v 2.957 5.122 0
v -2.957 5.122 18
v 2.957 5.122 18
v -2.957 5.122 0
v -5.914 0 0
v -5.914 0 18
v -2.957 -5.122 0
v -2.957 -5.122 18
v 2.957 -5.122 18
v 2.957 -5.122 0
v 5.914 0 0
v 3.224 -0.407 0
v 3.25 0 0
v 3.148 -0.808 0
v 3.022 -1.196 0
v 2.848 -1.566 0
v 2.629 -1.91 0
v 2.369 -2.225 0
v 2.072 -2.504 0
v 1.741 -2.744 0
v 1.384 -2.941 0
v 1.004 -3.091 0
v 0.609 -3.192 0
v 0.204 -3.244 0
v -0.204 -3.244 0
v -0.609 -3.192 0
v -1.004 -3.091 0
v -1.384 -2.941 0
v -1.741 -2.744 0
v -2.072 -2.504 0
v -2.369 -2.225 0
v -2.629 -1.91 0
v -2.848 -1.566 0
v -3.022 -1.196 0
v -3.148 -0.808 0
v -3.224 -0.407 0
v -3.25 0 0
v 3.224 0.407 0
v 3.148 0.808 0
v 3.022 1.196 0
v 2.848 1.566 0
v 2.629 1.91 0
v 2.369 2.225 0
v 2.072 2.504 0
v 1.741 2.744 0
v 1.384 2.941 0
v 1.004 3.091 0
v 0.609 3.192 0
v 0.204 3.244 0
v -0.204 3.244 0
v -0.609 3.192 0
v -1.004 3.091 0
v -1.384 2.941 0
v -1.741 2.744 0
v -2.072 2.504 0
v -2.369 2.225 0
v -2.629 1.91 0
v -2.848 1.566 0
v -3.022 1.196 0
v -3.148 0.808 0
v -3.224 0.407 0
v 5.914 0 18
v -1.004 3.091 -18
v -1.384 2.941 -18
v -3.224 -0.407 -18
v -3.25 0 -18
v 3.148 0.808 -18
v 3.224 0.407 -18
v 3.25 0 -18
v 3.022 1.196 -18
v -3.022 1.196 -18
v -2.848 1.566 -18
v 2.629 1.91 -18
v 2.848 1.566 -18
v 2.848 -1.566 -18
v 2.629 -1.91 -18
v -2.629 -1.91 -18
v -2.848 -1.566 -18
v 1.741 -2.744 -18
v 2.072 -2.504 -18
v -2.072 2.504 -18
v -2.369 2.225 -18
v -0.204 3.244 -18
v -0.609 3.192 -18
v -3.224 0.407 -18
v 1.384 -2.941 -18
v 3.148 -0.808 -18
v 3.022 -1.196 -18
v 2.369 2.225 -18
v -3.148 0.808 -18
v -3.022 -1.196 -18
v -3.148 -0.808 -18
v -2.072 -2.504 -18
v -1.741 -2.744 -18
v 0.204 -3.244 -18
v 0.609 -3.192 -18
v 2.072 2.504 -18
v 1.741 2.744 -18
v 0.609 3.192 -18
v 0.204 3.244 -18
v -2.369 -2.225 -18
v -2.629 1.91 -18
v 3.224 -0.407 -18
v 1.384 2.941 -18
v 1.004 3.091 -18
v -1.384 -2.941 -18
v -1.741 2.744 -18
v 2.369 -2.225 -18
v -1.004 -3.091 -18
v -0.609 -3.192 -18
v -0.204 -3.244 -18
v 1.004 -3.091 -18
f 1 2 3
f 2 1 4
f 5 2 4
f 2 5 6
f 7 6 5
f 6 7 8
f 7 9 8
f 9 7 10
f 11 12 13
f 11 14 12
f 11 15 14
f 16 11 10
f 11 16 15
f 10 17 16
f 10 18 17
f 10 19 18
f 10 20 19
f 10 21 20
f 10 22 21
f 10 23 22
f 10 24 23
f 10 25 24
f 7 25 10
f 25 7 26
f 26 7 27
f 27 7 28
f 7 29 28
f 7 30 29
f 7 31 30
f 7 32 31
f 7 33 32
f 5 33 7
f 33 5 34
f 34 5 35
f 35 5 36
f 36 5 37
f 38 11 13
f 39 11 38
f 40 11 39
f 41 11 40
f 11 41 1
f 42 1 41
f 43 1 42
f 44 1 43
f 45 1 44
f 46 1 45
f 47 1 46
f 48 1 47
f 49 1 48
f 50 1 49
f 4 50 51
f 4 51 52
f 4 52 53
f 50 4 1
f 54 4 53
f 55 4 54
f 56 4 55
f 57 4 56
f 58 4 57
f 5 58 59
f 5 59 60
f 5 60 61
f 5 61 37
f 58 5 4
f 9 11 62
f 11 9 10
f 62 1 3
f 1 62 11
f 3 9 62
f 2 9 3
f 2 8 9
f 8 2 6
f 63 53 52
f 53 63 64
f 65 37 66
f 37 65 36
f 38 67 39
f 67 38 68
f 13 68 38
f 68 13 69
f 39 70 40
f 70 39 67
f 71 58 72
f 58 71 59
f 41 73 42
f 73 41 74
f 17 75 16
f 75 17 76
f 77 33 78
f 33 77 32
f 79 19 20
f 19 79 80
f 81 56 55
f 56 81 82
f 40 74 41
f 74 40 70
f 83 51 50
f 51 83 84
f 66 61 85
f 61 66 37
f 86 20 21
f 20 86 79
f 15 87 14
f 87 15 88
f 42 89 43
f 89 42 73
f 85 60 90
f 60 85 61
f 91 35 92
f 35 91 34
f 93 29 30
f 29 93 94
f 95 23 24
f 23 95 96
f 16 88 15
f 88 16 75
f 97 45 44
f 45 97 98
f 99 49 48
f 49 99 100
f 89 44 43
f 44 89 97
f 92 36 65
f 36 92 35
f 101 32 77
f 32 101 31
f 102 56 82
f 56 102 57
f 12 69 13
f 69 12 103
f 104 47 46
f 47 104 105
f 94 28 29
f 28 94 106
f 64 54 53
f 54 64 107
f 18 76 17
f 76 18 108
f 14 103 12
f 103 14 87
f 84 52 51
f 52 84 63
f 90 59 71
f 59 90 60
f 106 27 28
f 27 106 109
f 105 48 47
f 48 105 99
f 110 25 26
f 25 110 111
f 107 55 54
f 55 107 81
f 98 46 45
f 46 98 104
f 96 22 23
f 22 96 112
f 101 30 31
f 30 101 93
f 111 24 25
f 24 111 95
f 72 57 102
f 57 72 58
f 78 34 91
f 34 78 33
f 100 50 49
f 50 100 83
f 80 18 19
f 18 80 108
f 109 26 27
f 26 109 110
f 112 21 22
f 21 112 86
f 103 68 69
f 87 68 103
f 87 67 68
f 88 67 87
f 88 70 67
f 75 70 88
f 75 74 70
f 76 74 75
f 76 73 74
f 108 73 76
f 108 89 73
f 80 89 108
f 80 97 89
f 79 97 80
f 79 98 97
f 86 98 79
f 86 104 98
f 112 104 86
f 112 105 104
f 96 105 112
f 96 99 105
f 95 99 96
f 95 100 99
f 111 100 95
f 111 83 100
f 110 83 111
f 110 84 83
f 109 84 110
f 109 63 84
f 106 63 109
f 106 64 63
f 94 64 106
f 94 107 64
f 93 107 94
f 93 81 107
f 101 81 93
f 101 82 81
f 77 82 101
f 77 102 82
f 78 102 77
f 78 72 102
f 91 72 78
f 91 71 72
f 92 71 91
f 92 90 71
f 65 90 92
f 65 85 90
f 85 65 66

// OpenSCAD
$fn = 50;


difference() {
	union() {
		linear_extrude(height = 18) {
			polygon(points = [[5.9142500000, 0.0000000000], [2.9571250000, 5.1218907443], [-2.9571250000, 5.1218907443], [-5.9142500000, 0.0000000000], [-2.9571250000, -5.1218907443], [2.9571250000, -5.1218907443]]);
		}
		translate(v = [0, 0, -18]) {
			cylinder(h = 18, r = 3.2500000000);
		}
	}
	union();
}
